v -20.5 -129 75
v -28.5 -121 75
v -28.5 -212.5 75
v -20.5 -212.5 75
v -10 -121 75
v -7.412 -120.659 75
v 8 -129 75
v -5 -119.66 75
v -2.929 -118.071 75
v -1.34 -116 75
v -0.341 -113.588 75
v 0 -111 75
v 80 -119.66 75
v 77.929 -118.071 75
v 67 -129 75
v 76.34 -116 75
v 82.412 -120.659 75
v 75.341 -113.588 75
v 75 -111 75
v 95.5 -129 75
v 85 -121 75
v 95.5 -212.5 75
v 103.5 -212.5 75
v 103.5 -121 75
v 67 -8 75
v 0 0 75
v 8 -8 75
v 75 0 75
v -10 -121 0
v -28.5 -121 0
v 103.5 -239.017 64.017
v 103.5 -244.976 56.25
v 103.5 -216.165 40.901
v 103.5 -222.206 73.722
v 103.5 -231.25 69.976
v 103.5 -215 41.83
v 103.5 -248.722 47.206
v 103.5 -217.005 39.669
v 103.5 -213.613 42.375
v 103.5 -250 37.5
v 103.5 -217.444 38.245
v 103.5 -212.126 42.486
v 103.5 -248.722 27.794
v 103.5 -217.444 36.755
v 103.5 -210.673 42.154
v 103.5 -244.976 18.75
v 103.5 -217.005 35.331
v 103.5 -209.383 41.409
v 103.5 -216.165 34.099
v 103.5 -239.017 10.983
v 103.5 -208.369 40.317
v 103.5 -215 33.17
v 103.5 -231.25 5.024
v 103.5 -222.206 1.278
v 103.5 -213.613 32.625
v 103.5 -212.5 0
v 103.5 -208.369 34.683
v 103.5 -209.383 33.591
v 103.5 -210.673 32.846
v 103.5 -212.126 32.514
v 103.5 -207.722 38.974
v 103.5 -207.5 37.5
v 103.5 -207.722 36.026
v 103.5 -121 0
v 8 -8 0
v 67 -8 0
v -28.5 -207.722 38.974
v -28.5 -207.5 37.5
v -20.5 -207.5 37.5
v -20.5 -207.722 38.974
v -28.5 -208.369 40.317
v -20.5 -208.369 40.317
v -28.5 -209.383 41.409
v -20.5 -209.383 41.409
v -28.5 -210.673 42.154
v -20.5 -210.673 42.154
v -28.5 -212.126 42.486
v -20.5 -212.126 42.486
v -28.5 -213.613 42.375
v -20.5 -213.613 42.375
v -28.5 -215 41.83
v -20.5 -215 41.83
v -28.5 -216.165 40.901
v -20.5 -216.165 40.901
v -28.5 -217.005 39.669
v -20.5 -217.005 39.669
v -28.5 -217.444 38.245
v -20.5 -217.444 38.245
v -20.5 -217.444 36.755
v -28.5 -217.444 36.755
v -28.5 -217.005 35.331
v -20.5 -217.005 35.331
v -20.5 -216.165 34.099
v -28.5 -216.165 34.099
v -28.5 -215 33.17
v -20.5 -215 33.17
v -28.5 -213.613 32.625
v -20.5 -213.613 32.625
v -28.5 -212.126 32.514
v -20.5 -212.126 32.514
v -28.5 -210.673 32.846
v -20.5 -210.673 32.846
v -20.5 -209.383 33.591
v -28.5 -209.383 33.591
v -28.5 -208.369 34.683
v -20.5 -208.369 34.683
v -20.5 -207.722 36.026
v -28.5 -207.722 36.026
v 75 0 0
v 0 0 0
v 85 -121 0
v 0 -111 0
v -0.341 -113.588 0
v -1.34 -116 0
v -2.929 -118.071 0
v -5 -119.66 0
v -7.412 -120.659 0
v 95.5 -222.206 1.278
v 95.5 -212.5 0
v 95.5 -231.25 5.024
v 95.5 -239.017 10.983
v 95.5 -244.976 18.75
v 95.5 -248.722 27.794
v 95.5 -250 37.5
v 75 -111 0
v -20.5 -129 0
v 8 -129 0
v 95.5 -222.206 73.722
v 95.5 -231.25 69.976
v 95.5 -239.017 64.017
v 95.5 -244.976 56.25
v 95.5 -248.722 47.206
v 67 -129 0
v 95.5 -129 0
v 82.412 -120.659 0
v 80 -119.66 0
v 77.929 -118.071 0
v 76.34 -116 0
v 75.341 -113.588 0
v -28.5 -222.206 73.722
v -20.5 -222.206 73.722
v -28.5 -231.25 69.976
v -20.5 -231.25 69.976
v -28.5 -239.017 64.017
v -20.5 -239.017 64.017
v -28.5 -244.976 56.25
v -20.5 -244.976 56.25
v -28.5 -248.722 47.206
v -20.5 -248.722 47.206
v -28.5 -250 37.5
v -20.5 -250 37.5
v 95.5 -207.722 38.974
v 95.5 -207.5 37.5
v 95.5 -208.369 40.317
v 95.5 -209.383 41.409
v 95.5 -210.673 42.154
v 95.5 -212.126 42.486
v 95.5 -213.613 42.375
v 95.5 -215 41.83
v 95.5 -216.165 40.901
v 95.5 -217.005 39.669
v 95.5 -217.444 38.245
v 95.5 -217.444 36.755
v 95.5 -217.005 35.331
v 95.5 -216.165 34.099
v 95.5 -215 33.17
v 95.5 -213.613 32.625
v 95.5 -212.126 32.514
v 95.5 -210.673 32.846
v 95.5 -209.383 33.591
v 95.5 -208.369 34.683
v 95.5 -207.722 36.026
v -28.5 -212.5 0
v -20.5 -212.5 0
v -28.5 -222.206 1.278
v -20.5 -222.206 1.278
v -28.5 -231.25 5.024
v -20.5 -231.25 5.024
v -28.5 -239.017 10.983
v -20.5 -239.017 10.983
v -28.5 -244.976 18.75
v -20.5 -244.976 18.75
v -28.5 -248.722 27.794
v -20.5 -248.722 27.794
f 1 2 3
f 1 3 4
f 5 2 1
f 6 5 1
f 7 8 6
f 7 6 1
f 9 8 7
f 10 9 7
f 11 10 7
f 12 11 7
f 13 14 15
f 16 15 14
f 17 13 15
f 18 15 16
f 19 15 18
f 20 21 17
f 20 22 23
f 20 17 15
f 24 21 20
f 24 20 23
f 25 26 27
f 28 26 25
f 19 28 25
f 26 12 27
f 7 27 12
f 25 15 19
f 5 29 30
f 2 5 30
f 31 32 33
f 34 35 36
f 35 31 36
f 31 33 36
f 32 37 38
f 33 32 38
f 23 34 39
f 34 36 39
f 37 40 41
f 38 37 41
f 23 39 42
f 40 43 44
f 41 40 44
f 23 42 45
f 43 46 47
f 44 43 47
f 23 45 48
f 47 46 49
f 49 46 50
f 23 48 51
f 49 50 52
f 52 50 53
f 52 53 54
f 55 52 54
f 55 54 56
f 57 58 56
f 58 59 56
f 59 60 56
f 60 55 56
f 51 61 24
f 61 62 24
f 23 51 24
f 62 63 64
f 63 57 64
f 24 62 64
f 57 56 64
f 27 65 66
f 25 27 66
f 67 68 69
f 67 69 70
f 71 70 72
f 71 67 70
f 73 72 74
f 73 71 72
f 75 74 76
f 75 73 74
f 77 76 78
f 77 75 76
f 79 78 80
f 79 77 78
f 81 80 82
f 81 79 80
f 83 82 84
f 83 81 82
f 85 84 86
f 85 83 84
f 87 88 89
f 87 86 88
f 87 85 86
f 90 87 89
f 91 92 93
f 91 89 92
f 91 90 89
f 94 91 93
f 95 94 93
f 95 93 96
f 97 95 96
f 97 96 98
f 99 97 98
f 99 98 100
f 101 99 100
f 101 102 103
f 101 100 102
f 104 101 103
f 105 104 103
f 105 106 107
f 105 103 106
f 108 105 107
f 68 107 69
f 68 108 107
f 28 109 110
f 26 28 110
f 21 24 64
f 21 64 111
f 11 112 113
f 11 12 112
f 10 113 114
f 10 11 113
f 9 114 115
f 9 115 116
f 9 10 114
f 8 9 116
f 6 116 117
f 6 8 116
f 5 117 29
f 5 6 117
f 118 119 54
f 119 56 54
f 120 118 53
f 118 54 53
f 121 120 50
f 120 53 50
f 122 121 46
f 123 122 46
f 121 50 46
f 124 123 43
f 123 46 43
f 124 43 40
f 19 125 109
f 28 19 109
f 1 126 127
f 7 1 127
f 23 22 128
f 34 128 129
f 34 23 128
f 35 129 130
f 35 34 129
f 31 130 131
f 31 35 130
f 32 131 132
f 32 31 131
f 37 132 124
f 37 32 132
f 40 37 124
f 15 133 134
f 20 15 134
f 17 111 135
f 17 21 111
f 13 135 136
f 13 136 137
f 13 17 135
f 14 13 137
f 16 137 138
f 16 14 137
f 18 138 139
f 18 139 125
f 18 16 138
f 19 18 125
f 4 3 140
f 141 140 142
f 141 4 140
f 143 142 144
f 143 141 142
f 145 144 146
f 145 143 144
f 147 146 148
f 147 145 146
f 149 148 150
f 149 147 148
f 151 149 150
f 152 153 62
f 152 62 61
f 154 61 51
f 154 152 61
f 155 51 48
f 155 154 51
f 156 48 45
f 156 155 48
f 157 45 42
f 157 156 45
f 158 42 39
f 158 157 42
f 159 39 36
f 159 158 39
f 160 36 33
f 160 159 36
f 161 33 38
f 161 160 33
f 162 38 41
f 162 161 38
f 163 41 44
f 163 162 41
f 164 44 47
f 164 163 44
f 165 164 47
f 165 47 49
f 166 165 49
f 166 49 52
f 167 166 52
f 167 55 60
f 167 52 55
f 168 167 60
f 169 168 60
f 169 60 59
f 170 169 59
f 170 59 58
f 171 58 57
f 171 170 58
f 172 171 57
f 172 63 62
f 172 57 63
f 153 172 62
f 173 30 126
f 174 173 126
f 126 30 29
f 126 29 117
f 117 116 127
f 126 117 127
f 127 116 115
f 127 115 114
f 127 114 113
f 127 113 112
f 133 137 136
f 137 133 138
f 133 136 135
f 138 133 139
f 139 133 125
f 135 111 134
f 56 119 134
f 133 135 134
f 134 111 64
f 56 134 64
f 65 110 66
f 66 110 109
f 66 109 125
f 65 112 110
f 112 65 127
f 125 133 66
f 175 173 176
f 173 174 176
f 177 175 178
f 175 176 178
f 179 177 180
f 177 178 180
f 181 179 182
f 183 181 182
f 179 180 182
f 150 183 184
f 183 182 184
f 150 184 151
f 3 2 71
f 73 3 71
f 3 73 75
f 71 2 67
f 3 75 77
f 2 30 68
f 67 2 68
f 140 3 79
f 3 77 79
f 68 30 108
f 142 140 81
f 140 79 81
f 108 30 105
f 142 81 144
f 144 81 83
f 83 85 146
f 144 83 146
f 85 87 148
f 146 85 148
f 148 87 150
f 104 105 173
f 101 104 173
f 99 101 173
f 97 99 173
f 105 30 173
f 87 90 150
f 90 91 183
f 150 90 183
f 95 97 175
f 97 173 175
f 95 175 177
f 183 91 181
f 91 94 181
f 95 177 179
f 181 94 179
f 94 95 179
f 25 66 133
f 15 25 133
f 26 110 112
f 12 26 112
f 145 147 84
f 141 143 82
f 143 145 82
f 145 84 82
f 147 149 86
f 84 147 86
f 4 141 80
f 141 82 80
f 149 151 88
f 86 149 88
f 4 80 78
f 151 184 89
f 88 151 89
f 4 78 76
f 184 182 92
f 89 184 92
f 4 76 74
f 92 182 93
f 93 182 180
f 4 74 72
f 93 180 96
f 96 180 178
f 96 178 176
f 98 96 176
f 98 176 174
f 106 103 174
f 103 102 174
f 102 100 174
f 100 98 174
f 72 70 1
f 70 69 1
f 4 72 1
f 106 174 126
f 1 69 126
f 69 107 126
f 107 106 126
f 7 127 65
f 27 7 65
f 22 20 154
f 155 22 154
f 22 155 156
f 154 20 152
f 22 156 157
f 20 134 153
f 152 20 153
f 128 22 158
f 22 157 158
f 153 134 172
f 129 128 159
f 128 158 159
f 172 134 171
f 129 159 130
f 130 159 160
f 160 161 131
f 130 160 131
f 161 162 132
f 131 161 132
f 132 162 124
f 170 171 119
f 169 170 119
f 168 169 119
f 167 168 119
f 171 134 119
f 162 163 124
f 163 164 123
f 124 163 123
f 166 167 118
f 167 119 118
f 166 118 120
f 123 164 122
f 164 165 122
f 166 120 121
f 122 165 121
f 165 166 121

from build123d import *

# Parameters (mm, degrees)
BOSS_EXTRUDE2_DEPTH     = 75
CUT_EXTRUDE1_DEPTH      = 148
CUT_EXTRUDE1_DEPTH_BACK = 47
SKETCH2_R               = 5
FILLET1_R               = 37.5
FILLET2_R               = 10


with BuildPart() as part:
    # Sketch1 → Boss-Extrude2 (new body)
    with BuildSketch(Plane.XY):
        Polygon((8, -117), (8, -8), (67, -8), (67, -117), (67, -121), (67, -129), (95.5, -129), (95.5, -250), (103.5, -250), (103.5, -121), (75, -121), (75, -8), (75, 0), (67, 0), (8, 0), (0, 0), (0, -8), (0, -121), (-28.5, -121), (-28.5, -250), (-20.5, -250), (-20.5, -129), (8, -129), (8, -125), (8, -121), align=None)
    extrude(amount=BOSS_EXTRUDE2_DEPTH)

    # Sketch2 → Cut-Extrude1 (cut, two sides: drawn at the far end of the back side and taken through both)
    with BuildSketch(Plane(origin=(0, 0, 0), x_dir=(0, 0, -1), z_dir=(1, 0, 0)).offset(-CUT_EXTRUDE1_DEPTH_BACK)):
        with Locations(Location((-37.5, -212.5, 0), (0, 0, 90))):
            Circle(SKETCH2_R)
    extrude(amount=CUT_EXTRUDE1_DEPTH + CUT_EXTRUDE1_DEPTH_BACK, mode=Mode.SUBTRACT)

    # Fillet1
    fillet1_edges = [part.edges().sort_by_distance(p)[0] for p in [
        (-24.5, -250, 0),
        (-24.5, -250, 75),
        (99.5, -250, 0),
        (99.5, -250, 75),
    ]]
    fillet(fillet1_edges, radius=FILLET1_R - 0.0001)  # a hair under: the kernel refuses the full size

    # Fillet2
    fillet2_edges = [part.edges().sort_by_distance(p)[0] for p in [
        (0, -121, 37.5),
        (75, -121, 37.5),
    ]]
    fillet(fillet2_edges, radius=FILLET2_R)


solid = part.part
